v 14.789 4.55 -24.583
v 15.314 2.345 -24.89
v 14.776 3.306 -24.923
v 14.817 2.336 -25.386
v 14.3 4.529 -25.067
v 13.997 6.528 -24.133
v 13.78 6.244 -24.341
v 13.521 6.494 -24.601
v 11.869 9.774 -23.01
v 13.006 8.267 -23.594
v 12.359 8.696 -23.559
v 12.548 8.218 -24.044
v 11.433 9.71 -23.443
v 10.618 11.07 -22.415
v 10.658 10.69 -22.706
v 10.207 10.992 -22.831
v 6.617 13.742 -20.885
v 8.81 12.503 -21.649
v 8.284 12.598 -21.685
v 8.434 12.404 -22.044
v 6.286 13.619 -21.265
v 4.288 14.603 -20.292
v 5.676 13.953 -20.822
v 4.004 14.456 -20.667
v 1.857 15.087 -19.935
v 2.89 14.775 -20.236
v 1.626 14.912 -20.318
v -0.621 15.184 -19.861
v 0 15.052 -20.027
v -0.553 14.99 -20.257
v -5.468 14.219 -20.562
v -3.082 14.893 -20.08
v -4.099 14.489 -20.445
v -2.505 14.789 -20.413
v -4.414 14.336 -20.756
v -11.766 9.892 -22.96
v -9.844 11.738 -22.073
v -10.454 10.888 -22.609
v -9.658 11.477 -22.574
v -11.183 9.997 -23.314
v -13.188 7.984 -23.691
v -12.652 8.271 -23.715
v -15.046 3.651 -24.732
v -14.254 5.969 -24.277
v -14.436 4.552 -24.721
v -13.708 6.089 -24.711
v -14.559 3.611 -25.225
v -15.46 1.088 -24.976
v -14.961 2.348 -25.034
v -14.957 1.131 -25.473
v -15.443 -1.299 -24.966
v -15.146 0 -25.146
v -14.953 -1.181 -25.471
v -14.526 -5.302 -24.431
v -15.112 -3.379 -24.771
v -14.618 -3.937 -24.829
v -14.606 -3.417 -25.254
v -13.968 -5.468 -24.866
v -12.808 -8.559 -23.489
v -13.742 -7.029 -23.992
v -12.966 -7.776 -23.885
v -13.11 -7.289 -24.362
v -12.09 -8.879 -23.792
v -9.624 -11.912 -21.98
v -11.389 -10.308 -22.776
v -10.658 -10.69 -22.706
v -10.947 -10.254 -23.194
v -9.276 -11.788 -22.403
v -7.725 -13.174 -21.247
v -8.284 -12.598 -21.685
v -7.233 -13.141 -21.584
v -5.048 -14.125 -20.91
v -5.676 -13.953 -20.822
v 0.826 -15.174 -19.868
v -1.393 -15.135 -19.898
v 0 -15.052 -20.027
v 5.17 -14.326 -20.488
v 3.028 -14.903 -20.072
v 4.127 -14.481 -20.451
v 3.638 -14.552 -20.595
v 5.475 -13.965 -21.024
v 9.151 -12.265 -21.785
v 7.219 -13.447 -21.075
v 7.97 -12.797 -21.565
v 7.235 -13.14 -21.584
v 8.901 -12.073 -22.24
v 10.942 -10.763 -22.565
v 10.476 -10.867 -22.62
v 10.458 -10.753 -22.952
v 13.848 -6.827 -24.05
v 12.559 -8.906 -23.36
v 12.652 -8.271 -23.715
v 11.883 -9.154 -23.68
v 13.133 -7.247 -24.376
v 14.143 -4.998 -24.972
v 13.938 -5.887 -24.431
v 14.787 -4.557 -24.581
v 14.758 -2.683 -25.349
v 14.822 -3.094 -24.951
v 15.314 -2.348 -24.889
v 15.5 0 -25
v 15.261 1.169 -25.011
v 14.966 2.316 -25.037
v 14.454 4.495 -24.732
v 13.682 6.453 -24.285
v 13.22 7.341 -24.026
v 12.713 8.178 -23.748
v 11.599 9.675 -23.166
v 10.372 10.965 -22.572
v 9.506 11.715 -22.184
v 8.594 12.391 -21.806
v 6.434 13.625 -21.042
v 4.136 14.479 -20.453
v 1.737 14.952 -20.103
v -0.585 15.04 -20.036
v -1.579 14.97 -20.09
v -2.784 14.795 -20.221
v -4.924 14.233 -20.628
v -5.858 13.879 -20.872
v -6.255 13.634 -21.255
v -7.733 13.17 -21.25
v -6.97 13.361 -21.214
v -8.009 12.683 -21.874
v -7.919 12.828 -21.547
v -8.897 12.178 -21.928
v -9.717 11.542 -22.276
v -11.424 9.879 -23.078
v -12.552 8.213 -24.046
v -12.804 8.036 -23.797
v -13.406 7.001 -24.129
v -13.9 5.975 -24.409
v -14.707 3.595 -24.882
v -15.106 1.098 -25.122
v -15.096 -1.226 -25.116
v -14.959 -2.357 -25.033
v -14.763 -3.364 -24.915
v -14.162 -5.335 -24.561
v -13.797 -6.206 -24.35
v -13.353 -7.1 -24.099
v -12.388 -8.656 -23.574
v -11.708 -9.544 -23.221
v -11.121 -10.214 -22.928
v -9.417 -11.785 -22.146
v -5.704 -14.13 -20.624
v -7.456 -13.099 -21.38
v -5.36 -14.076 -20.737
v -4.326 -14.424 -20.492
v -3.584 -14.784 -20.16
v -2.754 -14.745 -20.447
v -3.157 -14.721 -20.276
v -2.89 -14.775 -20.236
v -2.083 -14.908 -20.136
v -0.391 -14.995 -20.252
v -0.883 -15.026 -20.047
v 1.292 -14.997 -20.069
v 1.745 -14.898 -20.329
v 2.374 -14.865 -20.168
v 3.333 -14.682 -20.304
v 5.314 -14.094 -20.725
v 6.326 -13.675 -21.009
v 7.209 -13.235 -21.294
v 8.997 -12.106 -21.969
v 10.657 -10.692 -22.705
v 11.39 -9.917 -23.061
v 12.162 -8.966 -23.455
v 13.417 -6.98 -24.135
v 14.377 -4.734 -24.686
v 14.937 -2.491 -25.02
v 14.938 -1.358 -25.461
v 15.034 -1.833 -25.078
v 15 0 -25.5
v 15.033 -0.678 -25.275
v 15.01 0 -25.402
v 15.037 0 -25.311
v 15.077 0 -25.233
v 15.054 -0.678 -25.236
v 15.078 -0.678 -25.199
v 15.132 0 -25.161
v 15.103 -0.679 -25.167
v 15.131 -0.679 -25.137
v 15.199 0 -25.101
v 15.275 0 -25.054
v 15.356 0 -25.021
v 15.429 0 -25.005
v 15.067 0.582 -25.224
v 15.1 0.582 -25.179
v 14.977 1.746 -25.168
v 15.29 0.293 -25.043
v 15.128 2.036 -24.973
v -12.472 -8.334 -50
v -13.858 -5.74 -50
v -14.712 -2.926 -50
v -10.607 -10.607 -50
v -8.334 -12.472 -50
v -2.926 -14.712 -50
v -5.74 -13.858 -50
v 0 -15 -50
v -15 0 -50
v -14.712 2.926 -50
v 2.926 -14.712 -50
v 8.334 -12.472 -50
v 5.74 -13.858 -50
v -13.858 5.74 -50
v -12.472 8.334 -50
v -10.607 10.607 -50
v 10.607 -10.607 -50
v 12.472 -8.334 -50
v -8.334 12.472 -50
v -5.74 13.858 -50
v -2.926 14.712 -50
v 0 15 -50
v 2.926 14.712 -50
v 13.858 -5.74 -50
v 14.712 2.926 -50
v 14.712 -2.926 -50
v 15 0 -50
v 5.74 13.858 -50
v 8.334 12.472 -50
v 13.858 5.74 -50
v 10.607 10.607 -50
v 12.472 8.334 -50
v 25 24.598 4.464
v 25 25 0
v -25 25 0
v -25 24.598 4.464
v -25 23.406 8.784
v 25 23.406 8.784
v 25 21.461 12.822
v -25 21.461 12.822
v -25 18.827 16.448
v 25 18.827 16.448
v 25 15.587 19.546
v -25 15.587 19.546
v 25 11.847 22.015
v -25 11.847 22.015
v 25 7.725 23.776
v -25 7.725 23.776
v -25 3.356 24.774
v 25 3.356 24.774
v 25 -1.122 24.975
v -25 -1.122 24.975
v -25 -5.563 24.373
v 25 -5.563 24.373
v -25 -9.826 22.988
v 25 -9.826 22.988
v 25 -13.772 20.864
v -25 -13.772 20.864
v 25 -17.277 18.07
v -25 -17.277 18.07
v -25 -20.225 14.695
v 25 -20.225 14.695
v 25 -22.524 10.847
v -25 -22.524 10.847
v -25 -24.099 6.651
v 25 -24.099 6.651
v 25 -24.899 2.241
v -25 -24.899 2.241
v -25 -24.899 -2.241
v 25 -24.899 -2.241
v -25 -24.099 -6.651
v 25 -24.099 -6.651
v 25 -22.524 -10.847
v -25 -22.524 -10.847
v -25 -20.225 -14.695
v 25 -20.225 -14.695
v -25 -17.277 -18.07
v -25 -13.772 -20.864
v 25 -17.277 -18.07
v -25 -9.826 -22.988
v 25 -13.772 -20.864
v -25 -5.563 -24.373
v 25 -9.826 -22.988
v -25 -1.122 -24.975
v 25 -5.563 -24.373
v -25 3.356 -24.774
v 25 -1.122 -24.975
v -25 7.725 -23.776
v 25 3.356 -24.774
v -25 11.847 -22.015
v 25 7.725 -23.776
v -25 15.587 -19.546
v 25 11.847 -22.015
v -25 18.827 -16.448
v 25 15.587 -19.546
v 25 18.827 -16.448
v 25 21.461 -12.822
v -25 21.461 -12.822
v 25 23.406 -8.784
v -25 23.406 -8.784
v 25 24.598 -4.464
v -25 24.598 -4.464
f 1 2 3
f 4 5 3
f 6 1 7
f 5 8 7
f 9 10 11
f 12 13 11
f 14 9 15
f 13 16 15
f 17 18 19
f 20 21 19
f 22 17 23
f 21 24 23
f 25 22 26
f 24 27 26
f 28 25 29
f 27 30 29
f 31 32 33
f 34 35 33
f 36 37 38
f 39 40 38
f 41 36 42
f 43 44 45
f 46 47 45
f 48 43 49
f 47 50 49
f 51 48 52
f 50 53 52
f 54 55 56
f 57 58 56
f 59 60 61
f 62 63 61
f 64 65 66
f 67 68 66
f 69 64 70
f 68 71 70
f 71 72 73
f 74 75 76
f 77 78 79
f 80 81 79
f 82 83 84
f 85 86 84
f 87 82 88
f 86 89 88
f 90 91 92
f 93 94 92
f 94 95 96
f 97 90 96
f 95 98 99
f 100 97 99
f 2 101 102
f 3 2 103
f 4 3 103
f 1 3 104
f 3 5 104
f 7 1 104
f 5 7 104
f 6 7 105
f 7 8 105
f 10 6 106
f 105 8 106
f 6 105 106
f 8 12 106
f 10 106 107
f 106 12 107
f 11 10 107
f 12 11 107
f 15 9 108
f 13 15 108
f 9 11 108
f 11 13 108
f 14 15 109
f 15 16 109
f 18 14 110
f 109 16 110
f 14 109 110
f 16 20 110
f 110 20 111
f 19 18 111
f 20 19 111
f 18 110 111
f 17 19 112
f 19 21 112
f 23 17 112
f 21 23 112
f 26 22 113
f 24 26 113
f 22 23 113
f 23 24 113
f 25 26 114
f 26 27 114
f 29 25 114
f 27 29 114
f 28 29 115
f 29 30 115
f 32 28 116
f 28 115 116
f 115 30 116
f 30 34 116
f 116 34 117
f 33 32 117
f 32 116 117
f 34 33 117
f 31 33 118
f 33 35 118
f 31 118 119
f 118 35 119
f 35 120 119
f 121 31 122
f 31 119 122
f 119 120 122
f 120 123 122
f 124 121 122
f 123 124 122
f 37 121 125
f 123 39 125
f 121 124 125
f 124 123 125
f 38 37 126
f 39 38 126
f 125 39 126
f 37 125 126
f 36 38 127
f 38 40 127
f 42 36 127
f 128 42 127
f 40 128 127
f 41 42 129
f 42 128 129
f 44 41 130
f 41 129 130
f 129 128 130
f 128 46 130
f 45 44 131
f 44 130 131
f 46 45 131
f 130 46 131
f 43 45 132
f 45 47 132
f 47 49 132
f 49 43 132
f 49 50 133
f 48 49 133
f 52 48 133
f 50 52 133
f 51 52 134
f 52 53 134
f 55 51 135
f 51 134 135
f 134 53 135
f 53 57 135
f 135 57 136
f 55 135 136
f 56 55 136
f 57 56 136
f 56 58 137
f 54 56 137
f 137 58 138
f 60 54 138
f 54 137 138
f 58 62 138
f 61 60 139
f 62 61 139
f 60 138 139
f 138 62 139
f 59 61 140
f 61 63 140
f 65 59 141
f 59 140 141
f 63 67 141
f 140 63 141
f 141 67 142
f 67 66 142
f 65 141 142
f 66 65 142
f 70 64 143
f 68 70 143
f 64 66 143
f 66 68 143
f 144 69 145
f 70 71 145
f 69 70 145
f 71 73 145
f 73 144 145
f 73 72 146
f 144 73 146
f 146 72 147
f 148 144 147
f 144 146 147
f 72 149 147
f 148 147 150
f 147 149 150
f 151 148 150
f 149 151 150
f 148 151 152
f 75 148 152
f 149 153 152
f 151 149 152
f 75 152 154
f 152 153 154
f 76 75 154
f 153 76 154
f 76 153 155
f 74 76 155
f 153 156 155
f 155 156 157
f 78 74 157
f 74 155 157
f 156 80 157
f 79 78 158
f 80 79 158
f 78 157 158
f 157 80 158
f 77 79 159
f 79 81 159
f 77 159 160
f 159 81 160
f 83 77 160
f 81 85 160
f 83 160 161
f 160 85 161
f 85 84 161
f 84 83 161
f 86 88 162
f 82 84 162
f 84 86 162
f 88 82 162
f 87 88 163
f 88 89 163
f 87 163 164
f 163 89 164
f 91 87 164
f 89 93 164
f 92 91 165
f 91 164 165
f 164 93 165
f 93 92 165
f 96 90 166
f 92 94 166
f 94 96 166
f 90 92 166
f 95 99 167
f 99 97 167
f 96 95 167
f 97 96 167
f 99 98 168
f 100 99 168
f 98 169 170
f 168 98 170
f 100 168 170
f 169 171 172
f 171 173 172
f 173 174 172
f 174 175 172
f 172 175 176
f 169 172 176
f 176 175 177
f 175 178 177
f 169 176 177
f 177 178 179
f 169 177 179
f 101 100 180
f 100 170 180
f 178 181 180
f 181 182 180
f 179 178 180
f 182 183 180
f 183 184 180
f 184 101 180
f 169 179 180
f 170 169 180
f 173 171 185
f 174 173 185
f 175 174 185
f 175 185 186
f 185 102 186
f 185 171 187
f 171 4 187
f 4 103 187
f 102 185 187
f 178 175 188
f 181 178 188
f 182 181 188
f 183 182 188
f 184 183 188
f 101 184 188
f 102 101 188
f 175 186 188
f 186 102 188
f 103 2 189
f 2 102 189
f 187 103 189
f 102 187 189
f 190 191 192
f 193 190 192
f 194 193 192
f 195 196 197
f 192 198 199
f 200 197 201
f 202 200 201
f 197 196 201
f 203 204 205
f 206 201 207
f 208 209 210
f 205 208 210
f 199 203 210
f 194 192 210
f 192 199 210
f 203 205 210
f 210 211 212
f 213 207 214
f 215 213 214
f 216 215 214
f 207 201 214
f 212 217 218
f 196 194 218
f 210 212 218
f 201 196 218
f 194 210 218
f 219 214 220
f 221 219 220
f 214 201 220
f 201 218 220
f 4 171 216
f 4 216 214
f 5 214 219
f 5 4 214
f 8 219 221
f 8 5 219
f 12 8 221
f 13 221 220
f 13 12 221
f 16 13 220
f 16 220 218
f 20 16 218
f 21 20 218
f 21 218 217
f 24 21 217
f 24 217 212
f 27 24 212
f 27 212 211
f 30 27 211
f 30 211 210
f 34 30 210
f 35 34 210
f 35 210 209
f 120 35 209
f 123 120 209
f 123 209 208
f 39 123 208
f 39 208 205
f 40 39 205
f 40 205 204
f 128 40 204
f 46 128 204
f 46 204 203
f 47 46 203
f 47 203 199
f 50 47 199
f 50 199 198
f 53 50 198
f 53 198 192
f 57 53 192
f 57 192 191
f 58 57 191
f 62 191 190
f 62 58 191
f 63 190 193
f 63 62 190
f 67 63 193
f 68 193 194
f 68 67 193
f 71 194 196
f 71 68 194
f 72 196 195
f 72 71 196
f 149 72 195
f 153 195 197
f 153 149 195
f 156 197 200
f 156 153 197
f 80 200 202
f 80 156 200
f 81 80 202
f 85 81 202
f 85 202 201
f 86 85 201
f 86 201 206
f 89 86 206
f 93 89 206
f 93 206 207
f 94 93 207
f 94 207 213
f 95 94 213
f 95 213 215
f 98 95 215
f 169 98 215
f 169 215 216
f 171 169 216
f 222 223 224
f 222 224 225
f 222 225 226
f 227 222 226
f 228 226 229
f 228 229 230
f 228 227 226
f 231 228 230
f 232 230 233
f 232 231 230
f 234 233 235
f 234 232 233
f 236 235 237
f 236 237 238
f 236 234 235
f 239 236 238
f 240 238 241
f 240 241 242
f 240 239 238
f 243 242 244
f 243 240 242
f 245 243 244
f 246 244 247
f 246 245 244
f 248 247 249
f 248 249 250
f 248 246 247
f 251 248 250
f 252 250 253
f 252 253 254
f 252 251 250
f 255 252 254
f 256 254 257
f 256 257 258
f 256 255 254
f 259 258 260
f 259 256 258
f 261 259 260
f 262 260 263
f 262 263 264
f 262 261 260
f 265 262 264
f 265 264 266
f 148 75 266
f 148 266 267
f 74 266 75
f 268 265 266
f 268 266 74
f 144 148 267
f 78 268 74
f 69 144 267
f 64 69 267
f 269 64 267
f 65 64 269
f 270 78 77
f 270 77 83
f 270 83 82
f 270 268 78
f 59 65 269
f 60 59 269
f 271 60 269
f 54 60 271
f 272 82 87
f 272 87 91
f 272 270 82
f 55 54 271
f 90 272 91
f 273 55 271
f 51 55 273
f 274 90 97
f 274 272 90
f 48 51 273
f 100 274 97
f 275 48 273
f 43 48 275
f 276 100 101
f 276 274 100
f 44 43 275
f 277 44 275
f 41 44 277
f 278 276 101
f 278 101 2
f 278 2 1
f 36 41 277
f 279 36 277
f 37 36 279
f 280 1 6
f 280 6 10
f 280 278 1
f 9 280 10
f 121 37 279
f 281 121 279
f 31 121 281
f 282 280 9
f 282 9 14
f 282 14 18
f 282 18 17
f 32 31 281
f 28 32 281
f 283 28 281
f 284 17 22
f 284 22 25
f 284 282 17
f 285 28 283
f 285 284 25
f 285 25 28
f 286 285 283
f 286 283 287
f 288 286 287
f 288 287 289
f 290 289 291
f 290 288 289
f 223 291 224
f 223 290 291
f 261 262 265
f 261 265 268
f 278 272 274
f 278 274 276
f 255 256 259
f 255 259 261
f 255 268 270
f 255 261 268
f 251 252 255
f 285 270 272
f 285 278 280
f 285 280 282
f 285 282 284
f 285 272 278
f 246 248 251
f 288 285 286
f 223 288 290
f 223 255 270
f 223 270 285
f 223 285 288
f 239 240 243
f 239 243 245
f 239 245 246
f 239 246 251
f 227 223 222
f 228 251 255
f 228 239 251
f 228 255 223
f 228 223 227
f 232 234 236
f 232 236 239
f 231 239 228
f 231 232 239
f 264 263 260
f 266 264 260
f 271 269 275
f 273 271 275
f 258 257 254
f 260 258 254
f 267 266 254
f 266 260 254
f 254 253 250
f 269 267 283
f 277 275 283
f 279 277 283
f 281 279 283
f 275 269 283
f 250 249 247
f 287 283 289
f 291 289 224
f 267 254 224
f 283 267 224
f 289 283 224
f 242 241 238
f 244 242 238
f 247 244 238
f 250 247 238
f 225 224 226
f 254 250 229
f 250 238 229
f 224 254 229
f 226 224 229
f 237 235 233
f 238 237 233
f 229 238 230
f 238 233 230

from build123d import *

# Parameters (mm, degrees)
F0_R     = 25
F1_DEPTH = 25
F2_R     = 15
F3_DEPTH = 50
F4_R     = 0.5


with BuildPart() as f1:
    # F0 (on Right) → F1 (new body, symmetric)
    with BuildSketch(Plane.YZ):
        Circle(F0_R)
    extrude(amount=F1_DEPTH, both=True)

    # F2 (on Top) → F3 (join)
    with BuildSketch(Plane.XY):
        Circle(F2_R)
    extrude(amount=-F3_DEPTH)

    # F4
    f4_edges = [f1.edges().sort_by_distance(p)[0] for p in [
        (-15, 0, -25),
    ]]
    fillet(f4_edges, radius=F4_R)


solid = f1.part
